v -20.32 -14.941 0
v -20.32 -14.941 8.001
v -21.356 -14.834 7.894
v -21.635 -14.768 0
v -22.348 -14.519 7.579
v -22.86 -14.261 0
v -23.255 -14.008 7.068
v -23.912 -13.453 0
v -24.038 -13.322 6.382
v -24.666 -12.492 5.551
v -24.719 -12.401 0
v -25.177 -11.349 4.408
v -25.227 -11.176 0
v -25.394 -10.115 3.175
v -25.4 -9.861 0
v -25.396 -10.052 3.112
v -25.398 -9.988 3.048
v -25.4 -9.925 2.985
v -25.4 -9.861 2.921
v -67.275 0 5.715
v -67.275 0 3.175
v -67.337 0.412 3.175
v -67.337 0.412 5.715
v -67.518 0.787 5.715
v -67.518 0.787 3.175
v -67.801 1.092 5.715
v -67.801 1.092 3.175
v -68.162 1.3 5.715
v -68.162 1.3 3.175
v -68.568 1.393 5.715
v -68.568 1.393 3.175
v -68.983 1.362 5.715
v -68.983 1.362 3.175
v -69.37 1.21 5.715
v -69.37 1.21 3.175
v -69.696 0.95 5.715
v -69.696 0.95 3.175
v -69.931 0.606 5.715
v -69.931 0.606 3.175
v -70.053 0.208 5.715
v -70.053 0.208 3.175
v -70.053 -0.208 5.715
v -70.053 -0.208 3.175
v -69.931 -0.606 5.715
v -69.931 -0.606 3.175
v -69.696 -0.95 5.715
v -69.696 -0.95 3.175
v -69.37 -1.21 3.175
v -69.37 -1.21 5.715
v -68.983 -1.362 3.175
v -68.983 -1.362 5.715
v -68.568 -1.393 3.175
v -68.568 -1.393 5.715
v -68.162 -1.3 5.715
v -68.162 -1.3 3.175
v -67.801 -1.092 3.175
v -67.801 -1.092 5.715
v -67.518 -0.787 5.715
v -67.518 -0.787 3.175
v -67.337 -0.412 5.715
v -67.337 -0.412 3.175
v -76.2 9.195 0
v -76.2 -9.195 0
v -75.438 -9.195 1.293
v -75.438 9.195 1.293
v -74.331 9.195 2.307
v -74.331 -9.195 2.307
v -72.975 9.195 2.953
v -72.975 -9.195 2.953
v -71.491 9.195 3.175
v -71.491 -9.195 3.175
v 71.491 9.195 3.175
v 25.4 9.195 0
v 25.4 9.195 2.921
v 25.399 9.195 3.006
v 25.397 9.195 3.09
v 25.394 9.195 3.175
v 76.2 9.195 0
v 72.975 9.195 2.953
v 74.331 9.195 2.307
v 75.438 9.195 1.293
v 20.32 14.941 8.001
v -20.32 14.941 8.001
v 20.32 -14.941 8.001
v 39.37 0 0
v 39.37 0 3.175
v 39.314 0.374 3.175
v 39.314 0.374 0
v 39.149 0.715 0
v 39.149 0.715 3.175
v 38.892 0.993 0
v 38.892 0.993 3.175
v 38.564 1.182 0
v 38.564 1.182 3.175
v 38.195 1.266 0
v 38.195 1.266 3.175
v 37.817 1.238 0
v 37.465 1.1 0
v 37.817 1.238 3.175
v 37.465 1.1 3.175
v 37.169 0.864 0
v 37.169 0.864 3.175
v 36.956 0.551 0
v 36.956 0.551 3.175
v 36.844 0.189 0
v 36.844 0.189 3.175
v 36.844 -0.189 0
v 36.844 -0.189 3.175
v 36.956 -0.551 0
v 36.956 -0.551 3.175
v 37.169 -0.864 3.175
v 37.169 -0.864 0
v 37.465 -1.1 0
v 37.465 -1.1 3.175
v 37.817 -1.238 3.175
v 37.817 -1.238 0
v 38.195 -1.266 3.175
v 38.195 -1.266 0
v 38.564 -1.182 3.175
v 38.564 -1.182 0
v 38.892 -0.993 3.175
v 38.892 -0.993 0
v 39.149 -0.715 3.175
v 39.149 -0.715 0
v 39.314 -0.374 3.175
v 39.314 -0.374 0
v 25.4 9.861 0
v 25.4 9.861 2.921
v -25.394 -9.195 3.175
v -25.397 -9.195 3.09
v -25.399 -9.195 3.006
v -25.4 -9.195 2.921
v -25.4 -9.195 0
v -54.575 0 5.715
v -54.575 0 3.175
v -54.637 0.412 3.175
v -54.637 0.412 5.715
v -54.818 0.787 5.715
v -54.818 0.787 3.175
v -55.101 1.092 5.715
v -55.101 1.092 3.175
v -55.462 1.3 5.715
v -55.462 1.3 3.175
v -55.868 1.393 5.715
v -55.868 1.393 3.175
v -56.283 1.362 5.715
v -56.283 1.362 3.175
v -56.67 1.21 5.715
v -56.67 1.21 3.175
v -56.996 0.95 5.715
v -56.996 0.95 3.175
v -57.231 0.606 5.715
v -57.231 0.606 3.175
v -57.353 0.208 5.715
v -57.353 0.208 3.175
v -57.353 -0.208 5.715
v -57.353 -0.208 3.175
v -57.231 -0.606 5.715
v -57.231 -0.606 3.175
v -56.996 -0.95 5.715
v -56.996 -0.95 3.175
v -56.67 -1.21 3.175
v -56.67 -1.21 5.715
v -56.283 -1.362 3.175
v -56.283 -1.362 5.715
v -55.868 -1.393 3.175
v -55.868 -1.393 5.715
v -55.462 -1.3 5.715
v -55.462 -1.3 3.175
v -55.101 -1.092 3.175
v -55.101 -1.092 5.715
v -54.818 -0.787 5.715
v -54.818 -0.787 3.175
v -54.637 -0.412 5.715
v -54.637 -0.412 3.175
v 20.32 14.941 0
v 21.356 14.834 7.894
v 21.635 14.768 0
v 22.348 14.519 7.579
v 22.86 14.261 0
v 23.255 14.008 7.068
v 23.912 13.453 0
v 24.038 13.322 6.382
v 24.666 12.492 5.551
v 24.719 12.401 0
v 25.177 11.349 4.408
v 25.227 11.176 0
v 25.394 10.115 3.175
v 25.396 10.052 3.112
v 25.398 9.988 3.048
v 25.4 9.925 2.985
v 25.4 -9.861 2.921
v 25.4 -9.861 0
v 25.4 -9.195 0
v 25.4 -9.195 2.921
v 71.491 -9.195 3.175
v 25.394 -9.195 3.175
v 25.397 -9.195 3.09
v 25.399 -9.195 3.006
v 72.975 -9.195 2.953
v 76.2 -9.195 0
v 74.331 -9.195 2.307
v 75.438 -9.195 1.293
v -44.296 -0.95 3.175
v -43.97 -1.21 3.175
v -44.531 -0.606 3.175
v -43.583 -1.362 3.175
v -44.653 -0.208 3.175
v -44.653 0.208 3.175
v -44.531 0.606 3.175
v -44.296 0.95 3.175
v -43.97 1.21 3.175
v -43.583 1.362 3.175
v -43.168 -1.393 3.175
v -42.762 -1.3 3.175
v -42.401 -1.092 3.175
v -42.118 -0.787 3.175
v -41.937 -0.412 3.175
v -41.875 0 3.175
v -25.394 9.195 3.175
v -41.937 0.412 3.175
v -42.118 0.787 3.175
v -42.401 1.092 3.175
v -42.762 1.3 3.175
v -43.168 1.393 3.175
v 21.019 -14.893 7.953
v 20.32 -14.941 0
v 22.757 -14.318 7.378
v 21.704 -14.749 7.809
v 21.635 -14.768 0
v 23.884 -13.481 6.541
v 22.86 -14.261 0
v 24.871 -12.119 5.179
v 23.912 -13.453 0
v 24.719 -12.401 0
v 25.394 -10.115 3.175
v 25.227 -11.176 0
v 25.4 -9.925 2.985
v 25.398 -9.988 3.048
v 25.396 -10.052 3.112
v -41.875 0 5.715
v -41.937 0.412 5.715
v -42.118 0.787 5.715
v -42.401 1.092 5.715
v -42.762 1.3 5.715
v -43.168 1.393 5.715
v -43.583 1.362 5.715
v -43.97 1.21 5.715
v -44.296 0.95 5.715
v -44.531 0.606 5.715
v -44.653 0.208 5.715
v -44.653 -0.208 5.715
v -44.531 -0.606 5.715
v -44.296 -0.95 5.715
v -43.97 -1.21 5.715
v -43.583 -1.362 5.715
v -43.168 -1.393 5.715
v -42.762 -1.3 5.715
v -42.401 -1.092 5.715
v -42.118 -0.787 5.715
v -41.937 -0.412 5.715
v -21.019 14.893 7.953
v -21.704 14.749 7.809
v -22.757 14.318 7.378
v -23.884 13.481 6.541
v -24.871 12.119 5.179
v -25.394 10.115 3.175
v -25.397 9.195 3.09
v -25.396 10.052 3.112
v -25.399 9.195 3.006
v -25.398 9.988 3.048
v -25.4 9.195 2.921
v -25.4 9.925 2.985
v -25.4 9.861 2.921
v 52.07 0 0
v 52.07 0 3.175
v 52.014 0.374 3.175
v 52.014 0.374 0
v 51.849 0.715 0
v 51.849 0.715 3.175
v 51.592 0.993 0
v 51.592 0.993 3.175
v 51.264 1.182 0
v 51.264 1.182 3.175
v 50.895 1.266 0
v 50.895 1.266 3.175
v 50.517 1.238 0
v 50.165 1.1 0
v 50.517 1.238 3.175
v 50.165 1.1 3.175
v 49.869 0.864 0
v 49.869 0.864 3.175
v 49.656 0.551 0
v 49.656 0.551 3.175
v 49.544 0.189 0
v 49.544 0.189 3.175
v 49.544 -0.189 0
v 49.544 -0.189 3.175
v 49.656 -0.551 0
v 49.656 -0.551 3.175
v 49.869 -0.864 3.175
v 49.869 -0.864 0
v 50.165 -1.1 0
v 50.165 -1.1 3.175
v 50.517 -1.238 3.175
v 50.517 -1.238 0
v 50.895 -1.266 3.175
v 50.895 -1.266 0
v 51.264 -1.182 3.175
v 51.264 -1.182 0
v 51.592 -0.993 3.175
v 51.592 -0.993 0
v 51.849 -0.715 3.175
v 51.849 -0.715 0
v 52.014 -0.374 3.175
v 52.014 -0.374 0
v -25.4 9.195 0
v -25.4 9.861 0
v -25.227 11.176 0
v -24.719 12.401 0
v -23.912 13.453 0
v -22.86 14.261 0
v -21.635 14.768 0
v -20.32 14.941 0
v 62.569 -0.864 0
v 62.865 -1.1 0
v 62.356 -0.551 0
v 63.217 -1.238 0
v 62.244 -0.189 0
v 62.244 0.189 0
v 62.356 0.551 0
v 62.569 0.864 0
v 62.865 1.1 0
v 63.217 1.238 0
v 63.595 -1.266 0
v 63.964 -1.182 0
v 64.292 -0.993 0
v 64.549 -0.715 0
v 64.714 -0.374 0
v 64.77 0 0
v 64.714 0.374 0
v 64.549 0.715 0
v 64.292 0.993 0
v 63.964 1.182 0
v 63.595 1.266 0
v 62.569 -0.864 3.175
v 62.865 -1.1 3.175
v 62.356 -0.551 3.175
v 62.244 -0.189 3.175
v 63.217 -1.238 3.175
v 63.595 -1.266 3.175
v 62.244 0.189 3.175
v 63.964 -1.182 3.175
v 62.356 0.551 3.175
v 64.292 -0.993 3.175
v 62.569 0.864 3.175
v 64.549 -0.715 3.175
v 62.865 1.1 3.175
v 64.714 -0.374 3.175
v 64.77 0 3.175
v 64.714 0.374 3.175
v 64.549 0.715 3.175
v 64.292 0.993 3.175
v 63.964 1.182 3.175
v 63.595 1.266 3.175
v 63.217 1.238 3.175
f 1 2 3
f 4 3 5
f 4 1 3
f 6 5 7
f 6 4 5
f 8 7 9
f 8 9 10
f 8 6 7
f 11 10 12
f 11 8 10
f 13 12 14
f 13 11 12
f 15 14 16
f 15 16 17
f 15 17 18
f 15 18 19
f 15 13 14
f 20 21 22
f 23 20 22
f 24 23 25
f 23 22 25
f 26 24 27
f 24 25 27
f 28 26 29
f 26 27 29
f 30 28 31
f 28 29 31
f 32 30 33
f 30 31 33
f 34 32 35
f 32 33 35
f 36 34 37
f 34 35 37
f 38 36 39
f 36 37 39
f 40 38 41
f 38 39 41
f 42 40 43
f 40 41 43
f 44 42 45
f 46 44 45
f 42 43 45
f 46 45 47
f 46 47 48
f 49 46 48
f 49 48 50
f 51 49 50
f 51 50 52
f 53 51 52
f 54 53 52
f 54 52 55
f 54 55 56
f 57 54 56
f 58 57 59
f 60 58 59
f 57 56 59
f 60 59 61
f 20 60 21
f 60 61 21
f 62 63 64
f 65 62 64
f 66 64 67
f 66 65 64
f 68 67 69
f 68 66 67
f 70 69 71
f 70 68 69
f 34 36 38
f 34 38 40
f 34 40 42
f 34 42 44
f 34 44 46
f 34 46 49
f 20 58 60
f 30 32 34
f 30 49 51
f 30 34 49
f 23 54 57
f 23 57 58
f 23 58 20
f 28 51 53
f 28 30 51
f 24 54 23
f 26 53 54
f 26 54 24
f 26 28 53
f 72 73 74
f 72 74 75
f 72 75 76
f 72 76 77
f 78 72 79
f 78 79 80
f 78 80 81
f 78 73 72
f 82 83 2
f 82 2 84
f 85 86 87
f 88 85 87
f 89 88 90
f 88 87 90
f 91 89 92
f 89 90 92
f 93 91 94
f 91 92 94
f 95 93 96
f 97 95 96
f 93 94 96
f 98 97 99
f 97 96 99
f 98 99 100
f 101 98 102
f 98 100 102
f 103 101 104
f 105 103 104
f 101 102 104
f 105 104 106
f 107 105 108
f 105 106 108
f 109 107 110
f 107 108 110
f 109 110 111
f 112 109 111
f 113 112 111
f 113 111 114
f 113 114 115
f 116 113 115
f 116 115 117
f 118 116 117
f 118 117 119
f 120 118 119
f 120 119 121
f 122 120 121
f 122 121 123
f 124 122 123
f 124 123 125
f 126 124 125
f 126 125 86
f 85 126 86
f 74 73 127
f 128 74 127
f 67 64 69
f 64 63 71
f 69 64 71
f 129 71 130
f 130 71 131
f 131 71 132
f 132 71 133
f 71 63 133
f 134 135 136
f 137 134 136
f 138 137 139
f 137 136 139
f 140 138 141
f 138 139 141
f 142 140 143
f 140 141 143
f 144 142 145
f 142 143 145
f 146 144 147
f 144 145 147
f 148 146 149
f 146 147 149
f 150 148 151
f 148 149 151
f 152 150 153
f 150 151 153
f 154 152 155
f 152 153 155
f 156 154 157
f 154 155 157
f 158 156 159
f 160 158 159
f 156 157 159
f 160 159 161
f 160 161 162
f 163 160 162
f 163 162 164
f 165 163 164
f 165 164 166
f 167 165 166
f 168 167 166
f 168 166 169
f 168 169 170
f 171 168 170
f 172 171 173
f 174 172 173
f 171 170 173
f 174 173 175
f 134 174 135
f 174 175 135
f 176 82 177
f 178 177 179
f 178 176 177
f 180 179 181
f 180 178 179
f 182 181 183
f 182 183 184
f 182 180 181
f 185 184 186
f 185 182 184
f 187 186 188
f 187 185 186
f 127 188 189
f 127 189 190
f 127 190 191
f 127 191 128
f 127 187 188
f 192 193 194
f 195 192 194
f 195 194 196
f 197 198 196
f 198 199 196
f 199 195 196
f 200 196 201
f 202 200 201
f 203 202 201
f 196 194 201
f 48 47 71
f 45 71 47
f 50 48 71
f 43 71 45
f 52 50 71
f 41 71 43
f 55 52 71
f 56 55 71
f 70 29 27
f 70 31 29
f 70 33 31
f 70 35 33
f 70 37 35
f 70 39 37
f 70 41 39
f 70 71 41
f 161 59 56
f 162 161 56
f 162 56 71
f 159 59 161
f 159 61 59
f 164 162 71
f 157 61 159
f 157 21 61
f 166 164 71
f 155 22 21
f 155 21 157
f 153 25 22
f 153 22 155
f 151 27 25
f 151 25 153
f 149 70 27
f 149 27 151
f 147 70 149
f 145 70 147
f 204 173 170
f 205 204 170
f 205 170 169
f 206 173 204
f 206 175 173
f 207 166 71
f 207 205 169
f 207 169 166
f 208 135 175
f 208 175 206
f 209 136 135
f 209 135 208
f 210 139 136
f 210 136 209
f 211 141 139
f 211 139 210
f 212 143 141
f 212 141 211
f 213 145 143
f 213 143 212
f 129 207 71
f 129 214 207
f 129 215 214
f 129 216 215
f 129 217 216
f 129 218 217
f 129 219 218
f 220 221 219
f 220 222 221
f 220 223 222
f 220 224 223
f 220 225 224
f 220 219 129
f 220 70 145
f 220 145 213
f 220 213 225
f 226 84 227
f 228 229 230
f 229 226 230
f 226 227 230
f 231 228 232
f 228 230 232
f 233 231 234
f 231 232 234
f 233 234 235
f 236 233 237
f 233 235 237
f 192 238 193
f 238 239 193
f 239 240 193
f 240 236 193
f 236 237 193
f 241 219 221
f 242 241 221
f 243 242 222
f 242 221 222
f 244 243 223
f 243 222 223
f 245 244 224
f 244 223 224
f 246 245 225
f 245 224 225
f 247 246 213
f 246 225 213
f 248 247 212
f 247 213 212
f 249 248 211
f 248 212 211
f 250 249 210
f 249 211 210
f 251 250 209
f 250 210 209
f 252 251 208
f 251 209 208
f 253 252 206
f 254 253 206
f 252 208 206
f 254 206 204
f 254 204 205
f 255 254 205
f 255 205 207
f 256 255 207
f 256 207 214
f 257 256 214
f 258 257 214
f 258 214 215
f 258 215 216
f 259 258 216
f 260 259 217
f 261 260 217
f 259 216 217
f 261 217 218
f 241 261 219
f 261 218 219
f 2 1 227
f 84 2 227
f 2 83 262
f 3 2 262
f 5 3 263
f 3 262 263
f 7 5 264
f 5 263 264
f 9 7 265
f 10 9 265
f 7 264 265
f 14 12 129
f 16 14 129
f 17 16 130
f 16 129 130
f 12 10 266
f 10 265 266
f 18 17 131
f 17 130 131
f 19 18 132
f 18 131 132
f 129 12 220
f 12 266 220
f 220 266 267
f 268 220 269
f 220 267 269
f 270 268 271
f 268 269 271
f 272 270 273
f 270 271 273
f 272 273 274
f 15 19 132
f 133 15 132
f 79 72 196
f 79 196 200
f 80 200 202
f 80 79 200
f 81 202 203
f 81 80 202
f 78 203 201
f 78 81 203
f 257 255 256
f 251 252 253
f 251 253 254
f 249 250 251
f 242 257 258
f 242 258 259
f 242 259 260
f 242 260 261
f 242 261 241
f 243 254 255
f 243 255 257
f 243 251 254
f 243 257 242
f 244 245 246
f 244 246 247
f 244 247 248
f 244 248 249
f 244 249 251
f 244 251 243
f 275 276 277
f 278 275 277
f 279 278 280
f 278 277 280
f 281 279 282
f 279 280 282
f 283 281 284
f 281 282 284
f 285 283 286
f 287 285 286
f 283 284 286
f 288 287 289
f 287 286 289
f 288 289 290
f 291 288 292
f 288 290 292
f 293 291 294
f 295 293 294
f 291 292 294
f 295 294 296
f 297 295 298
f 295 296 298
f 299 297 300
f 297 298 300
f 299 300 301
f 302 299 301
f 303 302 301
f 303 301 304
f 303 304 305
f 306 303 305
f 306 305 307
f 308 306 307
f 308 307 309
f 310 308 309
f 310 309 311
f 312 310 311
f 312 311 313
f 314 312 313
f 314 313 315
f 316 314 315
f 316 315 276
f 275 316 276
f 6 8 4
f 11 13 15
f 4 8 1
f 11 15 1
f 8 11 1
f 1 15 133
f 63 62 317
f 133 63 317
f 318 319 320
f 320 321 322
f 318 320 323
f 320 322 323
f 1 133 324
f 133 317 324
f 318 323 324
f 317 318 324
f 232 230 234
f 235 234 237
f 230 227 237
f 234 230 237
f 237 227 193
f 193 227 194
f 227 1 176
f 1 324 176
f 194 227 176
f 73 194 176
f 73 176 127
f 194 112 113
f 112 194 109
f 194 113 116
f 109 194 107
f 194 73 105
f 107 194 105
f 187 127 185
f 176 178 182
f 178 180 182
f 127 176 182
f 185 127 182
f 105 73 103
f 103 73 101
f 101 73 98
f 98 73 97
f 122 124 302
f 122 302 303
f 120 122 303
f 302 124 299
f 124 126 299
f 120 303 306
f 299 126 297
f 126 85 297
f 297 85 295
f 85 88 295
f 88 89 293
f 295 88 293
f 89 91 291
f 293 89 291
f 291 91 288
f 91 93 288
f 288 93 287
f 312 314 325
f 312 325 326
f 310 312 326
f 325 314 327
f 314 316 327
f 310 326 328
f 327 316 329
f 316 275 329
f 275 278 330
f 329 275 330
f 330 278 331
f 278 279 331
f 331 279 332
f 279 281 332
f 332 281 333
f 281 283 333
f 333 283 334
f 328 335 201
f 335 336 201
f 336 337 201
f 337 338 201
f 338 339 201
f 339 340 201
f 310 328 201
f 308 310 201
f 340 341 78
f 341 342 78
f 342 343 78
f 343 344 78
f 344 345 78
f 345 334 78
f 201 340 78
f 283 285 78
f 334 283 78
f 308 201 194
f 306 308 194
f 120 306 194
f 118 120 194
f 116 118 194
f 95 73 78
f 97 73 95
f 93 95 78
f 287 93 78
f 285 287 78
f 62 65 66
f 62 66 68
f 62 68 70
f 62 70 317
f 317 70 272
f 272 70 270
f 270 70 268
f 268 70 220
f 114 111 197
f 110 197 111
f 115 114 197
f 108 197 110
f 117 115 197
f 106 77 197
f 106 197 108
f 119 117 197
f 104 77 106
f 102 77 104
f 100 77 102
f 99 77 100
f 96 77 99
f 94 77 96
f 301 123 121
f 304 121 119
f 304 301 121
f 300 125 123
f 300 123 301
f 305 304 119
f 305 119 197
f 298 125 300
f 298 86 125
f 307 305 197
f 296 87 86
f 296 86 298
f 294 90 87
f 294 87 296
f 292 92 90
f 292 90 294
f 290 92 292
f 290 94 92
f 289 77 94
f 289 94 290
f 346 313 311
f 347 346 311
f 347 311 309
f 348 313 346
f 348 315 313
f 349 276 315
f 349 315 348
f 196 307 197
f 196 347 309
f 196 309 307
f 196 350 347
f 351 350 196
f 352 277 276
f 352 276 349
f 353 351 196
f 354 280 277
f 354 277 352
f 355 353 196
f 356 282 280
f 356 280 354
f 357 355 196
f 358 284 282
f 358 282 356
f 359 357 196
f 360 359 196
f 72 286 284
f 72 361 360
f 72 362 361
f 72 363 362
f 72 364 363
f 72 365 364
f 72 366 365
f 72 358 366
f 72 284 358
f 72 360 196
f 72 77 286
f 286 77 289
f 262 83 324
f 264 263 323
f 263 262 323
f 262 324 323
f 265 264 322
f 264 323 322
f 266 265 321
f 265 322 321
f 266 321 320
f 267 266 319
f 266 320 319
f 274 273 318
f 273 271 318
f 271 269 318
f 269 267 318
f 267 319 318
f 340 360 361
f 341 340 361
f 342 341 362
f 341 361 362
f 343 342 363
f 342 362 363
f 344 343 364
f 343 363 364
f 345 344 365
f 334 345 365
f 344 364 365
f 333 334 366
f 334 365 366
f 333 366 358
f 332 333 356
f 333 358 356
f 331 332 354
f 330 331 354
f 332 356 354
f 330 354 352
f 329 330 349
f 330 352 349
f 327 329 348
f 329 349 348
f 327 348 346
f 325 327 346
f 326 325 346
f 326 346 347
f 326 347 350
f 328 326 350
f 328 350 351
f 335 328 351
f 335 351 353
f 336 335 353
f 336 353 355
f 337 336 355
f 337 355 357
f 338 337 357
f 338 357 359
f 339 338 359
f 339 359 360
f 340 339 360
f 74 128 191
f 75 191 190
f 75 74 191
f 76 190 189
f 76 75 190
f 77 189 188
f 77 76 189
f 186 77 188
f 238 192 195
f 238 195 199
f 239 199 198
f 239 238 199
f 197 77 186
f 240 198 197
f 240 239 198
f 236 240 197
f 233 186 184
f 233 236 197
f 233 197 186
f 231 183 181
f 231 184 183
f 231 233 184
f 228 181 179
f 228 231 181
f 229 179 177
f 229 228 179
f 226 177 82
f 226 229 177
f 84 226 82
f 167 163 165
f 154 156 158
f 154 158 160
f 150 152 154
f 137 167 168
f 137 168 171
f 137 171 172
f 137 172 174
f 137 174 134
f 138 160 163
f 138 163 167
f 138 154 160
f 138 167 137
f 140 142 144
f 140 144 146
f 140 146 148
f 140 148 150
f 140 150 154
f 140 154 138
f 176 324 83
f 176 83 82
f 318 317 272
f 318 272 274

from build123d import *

# Parameters (mm, degrees)
F0_W         = 50.8
F0_H         = 18.3891410583
F1_DEPTH     = 3.175
F2_R         = 1.27
F3_DEPTH     = 25.4
F4_R         = 1.397
F5_DEPTH     = 2.54
F6_W         = 50.8
F6_H         = 29.8823560312
F7_DEPTH     = 4.826
F8_T1_DEPTH  = 33.401
F8_T6_DEPTH  = 55.2823560312
F8_T12_DEPTH = 55.2823560312
F8_T18_DEPTH = 55.2823560312
F8_T25_DEPTH = 55.2823560312
F8_T31_DEPTH = 55.2823560312
F8_T37_DEPTH = 55.2823560312
F8_T43_DEPTH = 55.2823560312
F8_T49_DEPTH = 55.2823560312
F8_T56_DEPTH = 55.2823560312
F8_T62_DEPTH = 55.2823560312
F9_T1_DEPTH  = 41.9355712549


# Not quite as in the source:
# - a fillet or chamfer that OpenCascade refuses, or shapes differently, is made with other operations: its cross-section is extruded or revolved along the edge and cut away or added


with BuildPart() as f1:
    # F0 (on Top) → F1 (new body)
    with BuildSketch(Plane.XY):
        Polygon((-25.4, -14.9411780156), (25.4, -14.9411780156), (25.4, -9.1945705292), (25.4, 9.1945705292), (25.4, 14.9411780156), (-25.4, 14.9411780156), (-25.4, 9.1945705292), (-25.4, -9.1945705292), align=None)
        with Locations((50.8, 0)):
            Rectangle(F0_W, F0_H)
        with Locations((-50.8, 0)):
            Rectangle(F0_W, F0_H)
    extrude(amount=F1_DEPTH)

    # F2 (on face) → F3 (cut)
    with BuildSketch(Plane.XY.offset(3.175)):
        with Locations((63.5, 0)):
            Circle(F2_R)
        with Locations((50.8, 0)):
            Circle(F2_R)
        with Locations((38.1, 0)):
            Circle(F2_R)
    extrude(amount=-F3_DEPTH, mode=Mode.SUBTRACT)

    # F4 (on face) → F5 (join)
    with BuildSketch(Plane.XY.offset(3.175)):
        with Locations((-68.6719441229, 0)):
            Circle(F4_R)
        with Locations((-55.9719441229, 0)):
            Circle(F4_R)
        with Locations((-43.2719441229, 0)):
            Circle(F4_R)
    extrude(amount=F5_DEPTH)

    # F6 (on face) → F7 (join)
    with BuildSketch(Plane.XY.offset(3.175)):
        Rectangle(F6_W, F6_H)
    extrude(amount=F7_DEPTH)

    # F8: fillet of radius 5.08 on 6 edges, made by hand

    # F8_s2 → F8_t1 (cut)
    with BuildSketch(Plane.XY.offset(-12.7)):
        with BuildLine():
            ThreePointArc((-20.32, 14.9411780156), (-23.9121024484, 13.453280464), (-25.4, 9.8611780156))
            Line((-25.4, 9.8611780156), (-25.4, 14.9411780156))
            Line((-25.4, 14.9411780156), (-20.32, 14.9411780156))
        make_face()
        with BuildLine():
            ThreePointArc((-20.32, -14.9411780156), (-23.9121024484, -13.453280464), (-25.4, -9.8611780156))
            Line((-25.4, -9.8611780156), (-25.4, -14.9411780156))
            Line((-25.4, -14.9411780156), (-20.32, -14.9411780156))
        make_face()
        with BuildLine():
            ThreePointArc((20.32, -14.9411780156), (23.9121024484, -13.453280464), (25.4, -9.8611780156))
            Line((25.4, -9.8611780156), (25.4, -14.9411780156))
            Line((25.4, -14.9411780156), (20.32, -14.9411780156))
        make_face()
        with BuildLine():
            ThreePointArc((20.32, 14.9411780156), (23.9121024484, 13.453280464), (25.4, 9.8611780156))
            Line((25.4, 9.8611780156), (25.4, 14.9411780156))
            Line((25.4, 14.9411780156), (20.32, 14.9411780156))
        make_face()
    extrude(amount=F8_T1_DEPTH, mode=Mode.SUBTRACT)


with BuildPart() as f8_tool4:
    # F8_s5 → F8_t6 (new body)
    with BuildSketch(Plane.XZ.offset(27.6411780156)):
        with BuildLine():
            ThreePointArc((25.4, 2.921), (23.9121024484, 6.5131024484), (20.32, 8.001))
            Line((20.32, 8.001), (25.4, 8.001))
            Line((25.4, 8.001), (25.4, 2.921))
        make_face()
    extrude(amount=-F8_T6_DEPTH)

    split(bisect_by=Plane.XY.offset(3.175), keep=Keep.BOTTOM)

    split(bisect_by=Plane.XZ.offset(9.1945705292), keep=Keep.TOP)


with BuildPart() as f1_1:
    add(f1.part)

    # F8_t3: cut F8_tool4
    add(f8_tool4.part, mode=Mode.SUBTRACT)


with BuildPart() as f8_tool10:
    # F8_s11 → F8_t12 (new body)
    with BuildSketch(Plane.XZ.offset(27.6411780156)):
        with BuildLine():
            ThreePointArc((25.4, 2.921), (23.9121024484, 6.5131024484), (20.32, 8.001))
            Line((20.32, 8.001), (25.4, 8.001))
            Line((25.4, 8.001), (25.4, 2.921))
        make_face()
    extrude(amount=-F8_T12_DEPTH)

    split(bisect_by=Plane.XY.offset(3.175), keep=Keep.TOP)

    split(bisect_by=Plane.XZ.offset(9.1945705292), keep=Keep.TOP)


with BuildPart() as f1_2:
    add(f1_1.part)

    # F8_t9: cut F8_tool10
    add(f8_tool10.part, mode=Mode.SUBTRACT)


with BuildPart() as f8_tool16:
    # F8_s17 → F8_t18 (new body)
    with BuildSketch(Plane.XZ.offset(27.6411780156)):
        with BuildLine():
            ThreePointArc((25.4, 2.921), (23.9121024484, 6.5131024484), (20.32, 8.001))
            Line((20.32, 8.001), (25.4, 8.001))
            Line((25.4, 8.001), (25.4, 2.921))
        make_face()
    extrude(amount=-F8_T18_DEPTH)

    split(bisect_by=Plane.XY.offset(3.175), keep=Keep.TOP)

    split(bisect_by=Plane.XZ.offset(-9.1945705292), keep=Keep.TOP)

    split(bisect_by=Plane.XZ.offset(9.1945705292), keep=Keep.BOTTOM)


with BuildPart() as f1_3:
    add(f1_2.part)

    # F8_t15: cut F8_tool16
    add(f8_tool16.part, mode=Mode.SUBTRACT)


with BuildPart() as f8_tool23:
    # F8_s24 → F8_t25 (new body)
    with BuildSketch(Plane.XZ.offset(27.6411780156)):
        with BuildLine():
            ThreePointArc((25.4, 2.921), (23.9121024484, 6.5131024484), (20.32, 8.001))
            Line((20.32, 8.001), (25.4, 8.001))
            Line((25.4, 8.001), (25.4, 2.921))
        make_face()
    extrude(amount=-F8_T25_DEPTH)

    split(bisect_by=Plane.XY.offset(3.175), keep=Keep.BOTTOM)

    split(bisect_by=Plane.XZ.offset(-9.1945705292), keep=Keep.BOTTOM)


with BuildPart() as f1_4:
    add(f1_3.part)

    # F8_t22: cut F8_tool23
    add(f8_tool23.part, mode=Mode.SUBTRACT)


with BuildPart() as f8_tool29:
    # F8_s30 → F8_t31 (new body)
    with BuildSketch(Plane.XZ.offset(27.6411780156)):
        with BuildLine():
            ThreePointArc((25.4, 2.921), (23.9121024484, 6.5131024484), (20.32, 8.001))
            Line((20.32, 8.001), (25.4, 8.001))
            Line((25.4, 8.001), (25.4, 2.921))
        make_face()
    extrude(amount=-F8_T31_DEPTH)

    split(bisect_by=Plane.XY.offset(3.175), keep=Keep.TOP)

    split(bisect_by=Plane.XZ.offset(-9.1945705292), keep=Keep.BOTTOM)


with BuildPart() as f1_5:
    add(f1_4.part)

    # F8_t28: cut F8_tool29
    add(f8_tool29.part, mode=Mode.SUBTRACT)


with BuildPart() as f8_tool35:
    # F8_s36 → F8_t37 (new body)
    with BuildSketch(Plane.XZ.offset(-27.6411780156)):
        with BuildLine():
            ThreePointArc((-20.32, 8.001), (-23.9121024484, 6.5131024484), (-25.4, 2.921))
            Line((-25.4, 2.921), (-25.4, 8.001))
            Line((-25.4, 8.001), (-20.32, 8.001))
        make_face()
    extrude(amount=F8_T37_DEPTH)

    split(bisect_by=Plane.XZ.offset(-9.1945705292), keep=Keep.BOTTOM)

    split(bisect_by=Plane.XY.offset(3.175), keep=Keep.TOP)


with BuildPart() as f1_6:
    add(f1_5.part)

    # F8_t34: cut F8_tool35
    add(f8_tool35.part, mode=Mode.SUBTRACT)


with BuildPart() as f8_tool41:
    # F8_s42 → F8_t43 (new body)
    with BuildSketch(Plane.XZ.offset(-27.6411780156)):
        with BuildLine():
            ThreePointArc((-20.32, 8.001), (-23.9121024484, 6.5131024484), (-25.4, 2.921))
            Line((-25.4, 2.921), (-25.4, 8.001))
            Line((-25.4, 8.001), (-20.32, 8.001))
        make_face()
    extrude(amount=F8_T43_DEPTH)

    split(bisect_by=Plane.XZ.offset(-9.1945705292), keep=Keep.BOTTOM)

    split(bisect_by=Plane.XY.offset(3.175), keep=Keep.BOTTOM)


with BuildPart() as f1_7:
    add(f1_6.part)

    # F8_t40: cut F8_tool41
    add(f8_tool41.part, mode=Mode.SUBTRACT)


with BuildPart() as f8_tool47:
    # F8_s48 → F8_t49 (new body)
    with BuildSketch(Plane.XZ.offset(-27.6411780156)):
        with BuildLine():
            ThreePointArc((-20.32, 8.001), (-23.9121024484, 6.5131024484), (-25.4, 2.921))
            Line((-25.4, 2.921), (-25.4, 8.001))
            Line((-25.4, 8.001), (-20.32, 8.001))
        make_face()
    extrude(amount=F8_T49_DEPTH)

    split(bisect_by=Plane.XZ.offset(-9.1945705292), keep=Keep.TOP)

    split(bisect_by=Plane.XY.offset(3.175), keep=Keep.TOP)

    split(bisect_by=Plane.XZ.offset(9.1945705292), keep=Keep.BOTTOM)


with BuildPart() as f1_8:
    add(f1_7.part)

    # F8_t46: cut F8_tool47
    add(f8_tool47.part, mode=Mode.SUBTRACT)


with BuildPart() as f8_tool54:
    # F8_s55 → F8_t56 (new body)
    with BuildSketch(Plane.XZ.offset(-27.6411780156)):
        with BuildLine():
            ThreePointArc((-20.32, 8.001), (-23.9121024484, 6.5131024484), (-25.4, 2.921))
            Line((-25.4, 2.921), (-25.4, 8.001))
            Line((-25.4, 8.001), (-20.32, 8.001))
        make_face()
    extrude(amount=F8_T56_DEPTH)

    split(bisect_by=Plane.XY.offset(3.175), keep=Keep.TOP)

    split(bisect_by=Plane.XZ.offset(9.1945705292), keep=Keep.TOP)


with BuildPart() as f1_9:
    add(f1_8.part)

    # F8_t53: cut F8_tool54
    add(f8_tool54.part, mode=Mode.SUBTRACT)


with BuildPart() as f8_tool60:
    # F8_s61 → F8_t62 (new body)
    with BuildSketch(Plane.XZ.offset(-27.6411780156)):
        with BuildLine():
            ThreePointArc((-20.32, 8.001), (-23.9121024484, 6.5131024484), (-25.4, 2.921))
            Line((-25.4, 2.921), (-25.4, 8.001))
            Line((-25.4, 8.001), (-20.32, 8.001))
        make_face()
    extrude(amount=F8_T62_DEPTH)

    split(bisect_by=Plane.XY.offset(3.175), keep=Keep.BOTTOM)

    split(bisect_by=Plane.XZ.offset(9.1945705292), keep=Keep.TOP)


with BuildPart() as f1_10:
    add(f1_9.part)

    # F8_t59: cut F8_tool60
    add(f8_tool60.part, mode=Mode.SUBTRACT)

    # F9: fillet of radius 5.08 on 2 edges, made by hand

    # F9_s2 → F9_t1 (cut)
    with BuildSketch(Plane.XZ.offset(-20.9677856274)):
        with BuildLine():
            ThreePointArc((71.4907139607, 3.175), (74.3305202921, 2.3071134838), (76.2, 0))
            Line((76.2, 0), (76.2, 3.175))
            Line((76.2, 3.175), (71.4907139607, 3.175))
        make_face()
        with BuildLine():
            ThreePointArc((-76.2, 0), (-74.3305202921, 2.3071134838), (-71.4907139607, 3.175))
            Line((-71.4907139607, 3.175), (-76.2, 3.175))
            Line((-76.2, 3.175), (-76.2, 0))
        make_face()
    extrude(amount=F9_T1_DEPTH, mode=Mode.SUBTRACT)


solid = f1_10.part
